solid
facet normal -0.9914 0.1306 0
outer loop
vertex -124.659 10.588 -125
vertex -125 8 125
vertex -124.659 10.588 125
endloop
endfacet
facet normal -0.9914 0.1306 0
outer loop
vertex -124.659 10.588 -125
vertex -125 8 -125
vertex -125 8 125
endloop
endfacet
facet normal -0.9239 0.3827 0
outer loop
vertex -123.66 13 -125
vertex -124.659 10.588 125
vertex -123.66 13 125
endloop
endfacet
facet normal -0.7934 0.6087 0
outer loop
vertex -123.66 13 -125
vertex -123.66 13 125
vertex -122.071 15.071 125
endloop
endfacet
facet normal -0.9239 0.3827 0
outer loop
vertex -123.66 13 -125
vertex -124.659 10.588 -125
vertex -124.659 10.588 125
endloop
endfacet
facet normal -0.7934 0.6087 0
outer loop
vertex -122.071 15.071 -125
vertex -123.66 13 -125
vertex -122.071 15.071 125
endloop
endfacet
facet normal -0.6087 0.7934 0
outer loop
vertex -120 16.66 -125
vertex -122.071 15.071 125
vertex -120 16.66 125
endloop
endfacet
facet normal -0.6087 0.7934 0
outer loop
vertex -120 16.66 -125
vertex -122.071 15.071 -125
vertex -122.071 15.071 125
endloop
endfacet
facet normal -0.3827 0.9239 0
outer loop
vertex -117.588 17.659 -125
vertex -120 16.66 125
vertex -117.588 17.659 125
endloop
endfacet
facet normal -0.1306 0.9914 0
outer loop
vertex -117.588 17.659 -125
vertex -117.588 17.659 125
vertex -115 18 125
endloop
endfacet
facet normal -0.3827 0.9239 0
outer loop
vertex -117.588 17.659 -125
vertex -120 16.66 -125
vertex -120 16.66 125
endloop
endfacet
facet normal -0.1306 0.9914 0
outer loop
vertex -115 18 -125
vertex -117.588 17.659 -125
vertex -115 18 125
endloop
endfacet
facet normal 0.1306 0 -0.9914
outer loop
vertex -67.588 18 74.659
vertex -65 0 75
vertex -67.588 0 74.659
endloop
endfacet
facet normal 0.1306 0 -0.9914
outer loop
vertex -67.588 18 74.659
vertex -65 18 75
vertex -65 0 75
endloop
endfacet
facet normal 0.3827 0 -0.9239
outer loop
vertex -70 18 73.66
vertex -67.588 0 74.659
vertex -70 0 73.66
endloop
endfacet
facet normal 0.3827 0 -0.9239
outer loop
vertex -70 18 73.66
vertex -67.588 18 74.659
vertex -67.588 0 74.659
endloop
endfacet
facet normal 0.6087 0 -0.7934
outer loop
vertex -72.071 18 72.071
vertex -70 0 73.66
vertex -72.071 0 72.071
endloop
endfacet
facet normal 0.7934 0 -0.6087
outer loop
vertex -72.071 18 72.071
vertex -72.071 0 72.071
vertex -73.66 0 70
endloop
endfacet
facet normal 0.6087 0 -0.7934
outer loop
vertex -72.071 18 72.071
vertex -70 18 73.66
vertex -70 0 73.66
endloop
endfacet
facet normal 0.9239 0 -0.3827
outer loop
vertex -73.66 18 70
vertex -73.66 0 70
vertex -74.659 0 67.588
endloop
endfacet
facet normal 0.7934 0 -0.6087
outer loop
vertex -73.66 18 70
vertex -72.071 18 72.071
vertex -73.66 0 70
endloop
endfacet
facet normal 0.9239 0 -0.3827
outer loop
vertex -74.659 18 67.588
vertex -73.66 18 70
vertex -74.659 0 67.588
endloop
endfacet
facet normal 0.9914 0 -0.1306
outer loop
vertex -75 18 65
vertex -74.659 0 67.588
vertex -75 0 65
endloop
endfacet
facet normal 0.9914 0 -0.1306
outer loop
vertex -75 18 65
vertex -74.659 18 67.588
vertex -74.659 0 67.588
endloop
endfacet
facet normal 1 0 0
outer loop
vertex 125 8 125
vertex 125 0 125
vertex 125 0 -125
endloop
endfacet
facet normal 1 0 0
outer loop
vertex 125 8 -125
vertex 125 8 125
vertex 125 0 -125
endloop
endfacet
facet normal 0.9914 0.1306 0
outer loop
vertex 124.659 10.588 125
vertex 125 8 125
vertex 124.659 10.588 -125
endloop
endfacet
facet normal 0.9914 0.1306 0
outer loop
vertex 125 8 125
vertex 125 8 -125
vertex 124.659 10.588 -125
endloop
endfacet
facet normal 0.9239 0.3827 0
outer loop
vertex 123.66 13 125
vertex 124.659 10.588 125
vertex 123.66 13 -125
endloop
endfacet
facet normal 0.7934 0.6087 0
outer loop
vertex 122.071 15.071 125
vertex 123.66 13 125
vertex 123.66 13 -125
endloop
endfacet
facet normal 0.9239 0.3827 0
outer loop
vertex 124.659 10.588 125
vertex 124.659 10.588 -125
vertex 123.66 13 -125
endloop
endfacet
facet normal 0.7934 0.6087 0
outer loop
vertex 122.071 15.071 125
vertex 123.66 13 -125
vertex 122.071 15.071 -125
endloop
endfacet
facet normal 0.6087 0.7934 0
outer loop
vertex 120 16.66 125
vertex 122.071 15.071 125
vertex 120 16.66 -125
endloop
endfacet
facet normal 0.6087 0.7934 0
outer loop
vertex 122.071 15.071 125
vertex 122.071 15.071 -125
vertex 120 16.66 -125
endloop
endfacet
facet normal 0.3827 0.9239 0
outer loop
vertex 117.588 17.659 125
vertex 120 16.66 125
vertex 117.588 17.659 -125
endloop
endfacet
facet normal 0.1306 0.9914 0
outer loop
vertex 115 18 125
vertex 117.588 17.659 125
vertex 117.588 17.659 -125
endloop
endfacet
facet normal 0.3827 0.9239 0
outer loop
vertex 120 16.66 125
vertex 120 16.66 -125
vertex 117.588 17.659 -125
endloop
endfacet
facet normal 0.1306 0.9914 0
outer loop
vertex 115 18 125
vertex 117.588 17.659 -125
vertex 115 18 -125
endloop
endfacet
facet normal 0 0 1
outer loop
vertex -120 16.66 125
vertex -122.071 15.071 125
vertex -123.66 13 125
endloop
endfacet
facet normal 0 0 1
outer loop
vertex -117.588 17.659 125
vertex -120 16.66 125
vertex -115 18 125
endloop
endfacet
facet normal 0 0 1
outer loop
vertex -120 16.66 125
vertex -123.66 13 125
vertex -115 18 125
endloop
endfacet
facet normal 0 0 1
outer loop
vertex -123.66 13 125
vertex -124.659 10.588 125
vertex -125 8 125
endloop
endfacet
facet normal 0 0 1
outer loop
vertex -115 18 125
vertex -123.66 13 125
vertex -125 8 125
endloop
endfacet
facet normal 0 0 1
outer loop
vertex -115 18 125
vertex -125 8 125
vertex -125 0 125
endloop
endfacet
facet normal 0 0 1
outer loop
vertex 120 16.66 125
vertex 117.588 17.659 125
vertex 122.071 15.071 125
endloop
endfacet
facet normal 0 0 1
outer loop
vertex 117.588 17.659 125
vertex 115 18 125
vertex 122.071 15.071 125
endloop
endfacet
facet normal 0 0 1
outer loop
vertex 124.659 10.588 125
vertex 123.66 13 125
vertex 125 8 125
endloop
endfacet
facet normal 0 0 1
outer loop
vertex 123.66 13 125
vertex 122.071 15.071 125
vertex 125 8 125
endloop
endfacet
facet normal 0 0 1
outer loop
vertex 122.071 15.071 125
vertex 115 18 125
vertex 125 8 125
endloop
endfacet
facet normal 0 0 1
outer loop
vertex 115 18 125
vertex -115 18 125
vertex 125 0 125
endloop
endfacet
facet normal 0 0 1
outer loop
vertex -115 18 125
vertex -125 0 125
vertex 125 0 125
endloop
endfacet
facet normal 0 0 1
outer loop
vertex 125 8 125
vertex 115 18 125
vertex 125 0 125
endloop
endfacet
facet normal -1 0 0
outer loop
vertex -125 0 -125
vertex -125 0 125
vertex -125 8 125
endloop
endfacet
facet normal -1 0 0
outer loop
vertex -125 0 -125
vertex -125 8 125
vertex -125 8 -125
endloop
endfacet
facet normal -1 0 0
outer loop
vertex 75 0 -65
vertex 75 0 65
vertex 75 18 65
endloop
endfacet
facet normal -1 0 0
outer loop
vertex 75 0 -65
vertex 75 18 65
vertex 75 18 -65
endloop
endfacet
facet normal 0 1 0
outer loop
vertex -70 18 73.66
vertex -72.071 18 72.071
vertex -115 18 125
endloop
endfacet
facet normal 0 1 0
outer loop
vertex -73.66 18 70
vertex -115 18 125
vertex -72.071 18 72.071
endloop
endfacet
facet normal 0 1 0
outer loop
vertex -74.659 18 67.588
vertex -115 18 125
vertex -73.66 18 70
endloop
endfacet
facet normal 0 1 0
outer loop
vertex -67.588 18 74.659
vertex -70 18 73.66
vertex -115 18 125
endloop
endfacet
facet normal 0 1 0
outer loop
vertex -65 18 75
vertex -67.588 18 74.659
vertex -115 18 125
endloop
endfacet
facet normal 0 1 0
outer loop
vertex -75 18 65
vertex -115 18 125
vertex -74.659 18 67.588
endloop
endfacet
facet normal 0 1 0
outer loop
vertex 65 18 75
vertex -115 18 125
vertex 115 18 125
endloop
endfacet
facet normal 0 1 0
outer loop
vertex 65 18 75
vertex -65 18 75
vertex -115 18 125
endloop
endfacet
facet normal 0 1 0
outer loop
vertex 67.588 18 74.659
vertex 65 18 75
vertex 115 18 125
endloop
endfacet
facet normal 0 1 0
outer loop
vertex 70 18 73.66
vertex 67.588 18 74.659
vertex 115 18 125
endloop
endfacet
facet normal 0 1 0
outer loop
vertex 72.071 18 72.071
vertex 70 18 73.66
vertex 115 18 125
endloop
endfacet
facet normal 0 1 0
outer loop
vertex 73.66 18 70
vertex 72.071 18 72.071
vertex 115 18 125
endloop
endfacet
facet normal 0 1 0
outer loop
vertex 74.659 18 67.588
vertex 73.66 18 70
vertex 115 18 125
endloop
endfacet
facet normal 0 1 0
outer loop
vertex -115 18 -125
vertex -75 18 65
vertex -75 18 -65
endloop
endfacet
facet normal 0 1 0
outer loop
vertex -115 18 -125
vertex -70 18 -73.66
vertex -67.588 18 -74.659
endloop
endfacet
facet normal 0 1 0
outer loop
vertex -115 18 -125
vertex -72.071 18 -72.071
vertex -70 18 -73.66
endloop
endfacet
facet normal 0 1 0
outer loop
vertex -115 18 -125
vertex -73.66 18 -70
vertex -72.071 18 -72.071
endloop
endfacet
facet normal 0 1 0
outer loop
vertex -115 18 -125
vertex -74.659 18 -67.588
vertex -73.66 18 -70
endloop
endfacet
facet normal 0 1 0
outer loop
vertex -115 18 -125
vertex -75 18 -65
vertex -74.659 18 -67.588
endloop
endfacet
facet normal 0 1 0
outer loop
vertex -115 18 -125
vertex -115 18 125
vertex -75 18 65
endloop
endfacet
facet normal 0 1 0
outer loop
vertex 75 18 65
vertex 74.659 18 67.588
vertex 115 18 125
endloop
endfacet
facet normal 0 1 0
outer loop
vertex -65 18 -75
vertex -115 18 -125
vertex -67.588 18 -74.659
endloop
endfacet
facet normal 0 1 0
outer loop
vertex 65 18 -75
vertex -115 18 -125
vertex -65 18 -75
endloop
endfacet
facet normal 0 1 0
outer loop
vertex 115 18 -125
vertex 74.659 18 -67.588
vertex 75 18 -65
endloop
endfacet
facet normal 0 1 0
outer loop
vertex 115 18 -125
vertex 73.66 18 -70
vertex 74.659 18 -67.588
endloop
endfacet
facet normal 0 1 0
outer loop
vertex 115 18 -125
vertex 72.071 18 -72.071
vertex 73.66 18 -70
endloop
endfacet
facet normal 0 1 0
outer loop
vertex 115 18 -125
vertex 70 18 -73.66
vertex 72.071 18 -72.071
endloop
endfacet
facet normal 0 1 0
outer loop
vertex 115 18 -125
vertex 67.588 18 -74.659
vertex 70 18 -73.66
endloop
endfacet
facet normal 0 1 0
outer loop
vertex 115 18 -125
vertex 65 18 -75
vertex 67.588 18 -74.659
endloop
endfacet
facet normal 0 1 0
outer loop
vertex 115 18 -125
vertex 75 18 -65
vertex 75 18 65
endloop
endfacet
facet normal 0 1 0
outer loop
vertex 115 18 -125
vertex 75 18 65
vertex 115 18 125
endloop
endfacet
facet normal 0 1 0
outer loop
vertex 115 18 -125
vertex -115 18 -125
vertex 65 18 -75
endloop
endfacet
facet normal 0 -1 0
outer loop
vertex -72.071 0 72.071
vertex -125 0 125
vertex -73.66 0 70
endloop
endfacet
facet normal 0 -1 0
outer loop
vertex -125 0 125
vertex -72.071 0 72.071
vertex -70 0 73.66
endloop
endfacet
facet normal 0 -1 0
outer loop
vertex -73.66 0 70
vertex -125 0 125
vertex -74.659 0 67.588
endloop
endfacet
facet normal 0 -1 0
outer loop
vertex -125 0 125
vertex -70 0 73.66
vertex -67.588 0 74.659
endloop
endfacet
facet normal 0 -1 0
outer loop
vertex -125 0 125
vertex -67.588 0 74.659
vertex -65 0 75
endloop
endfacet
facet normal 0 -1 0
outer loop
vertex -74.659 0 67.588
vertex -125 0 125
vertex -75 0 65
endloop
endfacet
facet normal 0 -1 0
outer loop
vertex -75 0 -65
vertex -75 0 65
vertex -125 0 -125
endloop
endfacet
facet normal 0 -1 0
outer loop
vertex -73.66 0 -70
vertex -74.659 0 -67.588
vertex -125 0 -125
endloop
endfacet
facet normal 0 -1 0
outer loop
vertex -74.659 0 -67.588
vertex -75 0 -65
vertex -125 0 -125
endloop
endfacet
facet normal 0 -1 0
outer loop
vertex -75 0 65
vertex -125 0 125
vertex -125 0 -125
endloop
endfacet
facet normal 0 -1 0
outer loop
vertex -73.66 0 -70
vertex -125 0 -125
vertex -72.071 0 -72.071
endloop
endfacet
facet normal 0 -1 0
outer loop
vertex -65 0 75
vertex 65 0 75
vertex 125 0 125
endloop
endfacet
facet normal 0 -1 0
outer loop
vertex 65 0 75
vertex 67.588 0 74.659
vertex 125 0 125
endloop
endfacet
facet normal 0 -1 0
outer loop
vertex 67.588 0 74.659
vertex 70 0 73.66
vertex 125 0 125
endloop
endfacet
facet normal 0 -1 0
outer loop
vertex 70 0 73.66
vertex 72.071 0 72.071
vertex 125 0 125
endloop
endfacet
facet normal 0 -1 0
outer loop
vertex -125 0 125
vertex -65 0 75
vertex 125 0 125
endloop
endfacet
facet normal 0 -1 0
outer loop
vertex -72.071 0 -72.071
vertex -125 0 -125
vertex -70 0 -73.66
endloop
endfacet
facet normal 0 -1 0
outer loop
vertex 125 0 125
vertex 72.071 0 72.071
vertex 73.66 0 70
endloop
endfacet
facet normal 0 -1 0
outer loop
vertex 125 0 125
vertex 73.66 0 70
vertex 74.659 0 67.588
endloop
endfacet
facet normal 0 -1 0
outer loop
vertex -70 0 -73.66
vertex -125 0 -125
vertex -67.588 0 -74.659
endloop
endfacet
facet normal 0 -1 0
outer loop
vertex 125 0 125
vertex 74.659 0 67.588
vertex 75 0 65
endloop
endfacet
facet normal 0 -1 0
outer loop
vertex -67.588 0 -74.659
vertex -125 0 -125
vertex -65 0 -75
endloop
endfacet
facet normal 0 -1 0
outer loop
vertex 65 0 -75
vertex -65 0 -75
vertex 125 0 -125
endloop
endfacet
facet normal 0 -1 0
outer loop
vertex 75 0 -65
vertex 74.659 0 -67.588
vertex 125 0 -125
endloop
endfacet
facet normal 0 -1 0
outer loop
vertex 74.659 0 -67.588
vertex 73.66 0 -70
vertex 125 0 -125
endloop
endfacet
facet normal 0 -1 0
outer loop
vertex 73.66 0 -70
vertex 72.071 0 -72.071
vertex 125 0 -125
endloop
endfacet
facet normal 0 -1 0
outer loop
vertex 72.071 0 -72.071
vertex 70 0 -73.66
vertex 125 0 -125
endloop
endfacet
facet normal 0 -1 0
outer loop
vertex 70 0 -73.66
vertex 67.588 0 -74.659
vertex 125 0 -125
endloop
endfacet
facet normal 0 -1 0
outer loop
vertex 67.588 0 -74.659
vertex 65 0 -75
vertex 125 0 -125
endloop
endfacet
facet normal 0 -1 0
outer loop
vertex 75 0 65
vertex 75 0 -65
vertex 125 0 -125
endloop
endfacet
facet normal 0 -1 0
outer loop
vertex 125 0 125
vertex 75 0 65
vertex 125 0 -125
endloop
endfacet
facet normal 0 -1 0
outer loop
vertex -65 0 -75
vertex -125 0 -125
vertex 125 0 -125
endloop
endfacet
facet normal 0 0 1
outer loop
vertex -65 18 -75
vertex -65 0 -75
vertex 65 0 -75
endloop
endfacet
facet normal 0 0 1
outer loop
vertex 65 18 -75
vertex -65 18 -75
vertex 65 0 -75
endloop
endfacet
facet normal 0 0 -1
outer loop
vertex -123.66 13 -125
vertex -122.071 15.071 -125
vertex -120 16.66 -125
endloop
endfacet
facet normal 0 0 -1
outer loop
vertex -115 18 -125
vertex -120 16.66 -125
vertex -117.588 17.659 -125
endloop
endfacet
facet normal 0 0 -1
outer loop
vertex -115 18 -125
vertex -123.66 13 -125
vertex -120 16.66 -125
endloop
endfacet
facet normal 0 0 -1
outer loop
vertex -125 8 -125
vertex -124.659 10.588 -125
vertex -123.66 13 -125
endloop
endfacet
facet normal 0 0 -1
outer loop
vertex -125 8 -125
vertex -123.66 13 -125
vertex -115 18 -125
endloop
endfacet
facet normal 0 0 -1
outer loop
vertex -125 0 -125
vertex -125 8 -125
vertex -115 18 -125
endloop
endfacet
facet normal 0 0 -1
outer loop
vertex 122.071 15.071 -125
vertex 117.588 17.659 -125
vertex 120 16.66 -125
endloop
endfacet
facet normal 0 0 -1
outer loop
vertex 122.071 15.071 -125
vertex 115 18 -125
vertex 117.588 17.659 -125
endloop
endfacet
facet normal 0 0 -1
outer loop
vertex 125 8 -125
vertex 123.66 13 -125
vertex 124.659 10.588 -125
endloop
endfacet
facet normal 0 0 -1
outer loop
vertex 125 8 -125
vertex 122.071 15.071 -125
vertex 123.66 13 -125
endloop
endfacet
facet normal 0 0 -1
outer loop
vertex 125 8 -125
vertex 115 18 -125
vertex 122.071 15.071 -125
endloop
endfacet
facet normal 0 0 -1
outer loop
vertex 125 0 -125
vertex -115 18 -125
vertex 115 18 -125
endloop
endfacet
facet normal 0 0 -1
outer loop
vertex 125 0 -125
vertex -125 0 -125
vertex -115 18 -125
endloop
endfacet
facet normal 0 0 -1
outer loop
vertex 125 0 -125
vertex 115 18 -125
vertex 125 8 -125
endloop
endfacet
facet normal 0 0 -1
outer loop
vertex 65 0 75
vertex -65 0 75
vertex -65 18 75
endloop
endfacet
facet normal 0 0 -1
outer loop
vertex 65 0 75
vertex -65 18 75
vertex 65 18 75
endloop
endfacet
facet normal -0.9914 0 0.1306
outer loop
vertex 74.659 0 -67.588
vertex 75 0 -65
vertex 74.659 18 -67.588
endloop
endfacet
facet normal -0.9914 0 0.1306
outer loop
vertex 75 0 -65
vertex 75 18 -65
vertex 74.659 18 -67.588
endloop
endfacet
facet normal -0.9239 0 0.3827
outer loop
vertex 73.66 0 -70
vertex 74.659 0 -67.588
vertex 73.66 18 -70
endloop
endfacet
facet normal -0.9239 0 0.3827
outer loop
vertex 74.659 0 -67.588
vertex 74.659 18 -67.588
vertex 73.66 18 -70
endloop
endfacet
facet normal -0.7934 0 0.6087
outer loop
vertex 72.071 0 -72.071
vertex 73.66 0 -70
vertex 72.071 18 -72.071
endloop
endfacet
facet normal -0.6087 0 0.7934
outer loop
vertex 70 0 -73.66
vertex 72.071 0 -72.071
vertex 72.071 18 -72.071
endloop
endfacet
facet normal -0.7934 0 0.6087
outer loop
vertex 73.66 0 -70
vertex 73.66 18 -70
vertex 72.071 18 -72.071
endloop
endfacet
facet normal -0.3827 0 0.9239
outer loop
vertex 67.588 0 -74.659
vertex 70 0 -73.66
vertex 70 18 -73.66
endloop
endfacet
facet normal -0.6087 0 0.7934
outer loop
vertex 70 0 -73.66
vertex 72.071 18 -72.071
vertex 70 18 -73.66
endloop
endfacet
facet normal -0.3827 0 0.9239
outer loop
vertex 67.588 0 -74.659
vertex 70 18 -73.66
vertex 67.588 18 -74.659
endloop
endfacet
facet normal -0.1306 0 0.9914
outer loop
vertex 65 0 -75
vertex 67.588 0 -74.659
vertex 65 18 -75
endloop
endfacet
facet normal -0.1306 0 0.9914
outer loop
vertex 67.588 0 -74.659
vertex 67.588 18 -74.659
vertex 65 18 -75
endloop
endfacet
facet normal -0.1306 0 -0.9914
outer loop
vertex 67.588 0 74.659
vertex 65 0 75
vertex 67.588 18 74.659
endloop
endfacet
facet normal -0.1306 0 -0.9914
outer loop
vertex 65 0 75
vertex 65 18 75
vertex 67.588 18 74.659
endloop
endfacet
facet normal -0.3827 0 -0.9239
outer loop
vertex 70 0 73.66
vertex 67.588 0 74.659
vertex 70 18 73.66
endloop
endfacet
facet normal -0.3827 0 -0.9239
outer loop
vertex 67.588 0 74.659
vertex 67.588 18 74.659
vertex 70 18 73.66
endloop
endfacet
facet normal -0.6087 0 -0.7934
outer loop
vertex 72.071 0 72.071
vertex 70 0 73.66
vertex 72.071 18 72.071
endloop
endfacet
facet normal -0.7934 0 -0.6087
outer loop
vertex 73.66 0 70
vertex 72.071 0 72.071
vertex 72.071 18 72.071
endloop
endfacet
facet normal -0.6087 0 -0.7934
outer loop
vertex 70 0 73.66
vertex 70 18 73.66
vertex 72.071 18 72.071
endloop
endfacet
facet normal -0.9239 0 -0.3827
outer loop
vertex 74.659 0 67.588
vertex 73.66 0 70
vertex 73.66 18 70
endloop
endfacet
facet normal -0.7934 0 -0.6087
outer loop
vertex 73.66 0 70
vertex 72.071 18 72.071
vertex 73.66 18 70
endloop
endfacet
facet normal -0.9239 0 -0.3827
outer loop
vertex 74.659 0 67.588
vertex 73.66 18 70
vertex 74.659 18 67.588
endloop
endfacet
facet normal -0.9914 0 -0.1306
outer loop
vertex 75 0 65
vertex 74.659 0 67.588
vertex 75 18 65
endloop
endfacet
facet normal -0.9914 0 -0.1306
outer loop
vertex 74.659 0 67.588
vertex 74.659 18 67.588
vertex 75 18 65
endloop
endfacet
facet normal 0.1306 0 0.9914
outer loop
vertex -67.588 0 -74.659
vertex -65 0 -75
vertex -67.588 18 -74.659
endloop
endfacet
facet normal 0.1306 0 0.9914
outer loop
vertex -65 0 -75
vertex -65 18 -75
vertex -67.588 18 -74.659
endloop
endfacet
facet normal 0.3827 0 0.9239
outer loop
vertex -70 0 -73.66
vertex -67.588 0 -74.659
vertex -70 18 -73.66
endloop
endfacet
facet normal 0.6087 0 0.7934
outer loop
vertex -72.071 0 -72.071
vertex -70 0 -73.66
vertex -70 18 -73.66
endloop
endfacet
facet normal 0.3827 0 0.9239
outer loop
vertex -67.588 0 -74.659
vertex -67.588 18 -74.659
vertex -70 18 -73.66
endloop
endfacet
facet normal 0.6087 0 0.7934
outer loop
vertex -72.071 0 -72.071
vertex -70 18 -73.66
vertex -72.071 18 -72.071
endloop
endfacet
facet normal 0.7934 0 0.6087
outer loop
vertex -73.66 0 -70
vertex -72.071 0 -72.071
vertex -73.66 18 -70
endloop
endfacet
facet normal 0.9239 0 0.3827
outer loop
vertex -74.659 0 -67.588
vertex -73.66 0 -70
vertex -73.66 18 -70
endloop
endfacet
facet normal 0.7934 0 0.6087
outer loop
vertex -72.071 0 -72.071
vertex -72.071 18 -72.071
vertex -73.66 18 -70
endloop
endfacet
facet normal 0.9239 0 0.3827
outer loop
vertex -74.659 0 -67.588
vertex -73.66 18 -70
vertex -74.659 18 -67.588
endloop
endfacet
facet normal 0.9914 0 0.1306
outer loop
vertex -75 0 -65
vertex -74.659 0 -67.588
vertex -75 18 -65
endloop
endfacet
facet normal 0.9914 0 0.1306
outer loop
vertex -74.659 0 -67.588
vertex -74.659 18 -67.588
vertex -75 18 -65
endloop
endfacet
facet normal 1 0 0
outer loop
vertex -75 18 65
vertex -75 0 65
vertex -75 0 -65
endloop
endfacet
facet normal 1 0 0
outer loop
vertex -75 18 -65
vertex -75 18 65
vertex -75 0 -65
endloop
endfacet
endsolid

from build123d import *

# Parameters (mm, degrees)
SKETCH_1_W      = 250
SKETCH_1_H      = 250
SKETCH_1_W_2    = 150
SKETCH_1_H_2    = 150
EXTRUDE_1_DEPTH = 18
FILLET_1_R      = 10
FILLET_2_R      = 10


with BuildPart() as part:
    # 草图1 → 凸台-拉伸1 (new body)
    with BuildSketch(Plane(origin=(0, 0, 0), x_dir=(1, 0, 0), z_dir=(0, 1, 0))):
        Rectangle(SKETCH_1_W, SKETCH_1_H)
        Rectangle(SKETCH_1_W_2, SKETCH_1_H_2, mode=Mode.SUBTRACT)
    extrude(amount=EXTRUDE_1_DEPTH)

    # 圆角1
    fillet_1_edges = [part.edges().sort_by_distance(p)[0] for p in [
        (125, 18, 0),
        (-125, 18, 0),
    ]]
    fillet(fillet_1_edges, radius=FILLET_1_R)

    # 圆角2
    fillet_2_edges = [part.edges().sort_by_distance(p)[0] for p in [
        (-75, 9, -75),
        (-75, 9, 75),
        (75, 9, 75),
        (75, 9, -75),
    ]]
    fillet(fillet_2_edges, radius=FILLET_2_R)


solid = part.part
